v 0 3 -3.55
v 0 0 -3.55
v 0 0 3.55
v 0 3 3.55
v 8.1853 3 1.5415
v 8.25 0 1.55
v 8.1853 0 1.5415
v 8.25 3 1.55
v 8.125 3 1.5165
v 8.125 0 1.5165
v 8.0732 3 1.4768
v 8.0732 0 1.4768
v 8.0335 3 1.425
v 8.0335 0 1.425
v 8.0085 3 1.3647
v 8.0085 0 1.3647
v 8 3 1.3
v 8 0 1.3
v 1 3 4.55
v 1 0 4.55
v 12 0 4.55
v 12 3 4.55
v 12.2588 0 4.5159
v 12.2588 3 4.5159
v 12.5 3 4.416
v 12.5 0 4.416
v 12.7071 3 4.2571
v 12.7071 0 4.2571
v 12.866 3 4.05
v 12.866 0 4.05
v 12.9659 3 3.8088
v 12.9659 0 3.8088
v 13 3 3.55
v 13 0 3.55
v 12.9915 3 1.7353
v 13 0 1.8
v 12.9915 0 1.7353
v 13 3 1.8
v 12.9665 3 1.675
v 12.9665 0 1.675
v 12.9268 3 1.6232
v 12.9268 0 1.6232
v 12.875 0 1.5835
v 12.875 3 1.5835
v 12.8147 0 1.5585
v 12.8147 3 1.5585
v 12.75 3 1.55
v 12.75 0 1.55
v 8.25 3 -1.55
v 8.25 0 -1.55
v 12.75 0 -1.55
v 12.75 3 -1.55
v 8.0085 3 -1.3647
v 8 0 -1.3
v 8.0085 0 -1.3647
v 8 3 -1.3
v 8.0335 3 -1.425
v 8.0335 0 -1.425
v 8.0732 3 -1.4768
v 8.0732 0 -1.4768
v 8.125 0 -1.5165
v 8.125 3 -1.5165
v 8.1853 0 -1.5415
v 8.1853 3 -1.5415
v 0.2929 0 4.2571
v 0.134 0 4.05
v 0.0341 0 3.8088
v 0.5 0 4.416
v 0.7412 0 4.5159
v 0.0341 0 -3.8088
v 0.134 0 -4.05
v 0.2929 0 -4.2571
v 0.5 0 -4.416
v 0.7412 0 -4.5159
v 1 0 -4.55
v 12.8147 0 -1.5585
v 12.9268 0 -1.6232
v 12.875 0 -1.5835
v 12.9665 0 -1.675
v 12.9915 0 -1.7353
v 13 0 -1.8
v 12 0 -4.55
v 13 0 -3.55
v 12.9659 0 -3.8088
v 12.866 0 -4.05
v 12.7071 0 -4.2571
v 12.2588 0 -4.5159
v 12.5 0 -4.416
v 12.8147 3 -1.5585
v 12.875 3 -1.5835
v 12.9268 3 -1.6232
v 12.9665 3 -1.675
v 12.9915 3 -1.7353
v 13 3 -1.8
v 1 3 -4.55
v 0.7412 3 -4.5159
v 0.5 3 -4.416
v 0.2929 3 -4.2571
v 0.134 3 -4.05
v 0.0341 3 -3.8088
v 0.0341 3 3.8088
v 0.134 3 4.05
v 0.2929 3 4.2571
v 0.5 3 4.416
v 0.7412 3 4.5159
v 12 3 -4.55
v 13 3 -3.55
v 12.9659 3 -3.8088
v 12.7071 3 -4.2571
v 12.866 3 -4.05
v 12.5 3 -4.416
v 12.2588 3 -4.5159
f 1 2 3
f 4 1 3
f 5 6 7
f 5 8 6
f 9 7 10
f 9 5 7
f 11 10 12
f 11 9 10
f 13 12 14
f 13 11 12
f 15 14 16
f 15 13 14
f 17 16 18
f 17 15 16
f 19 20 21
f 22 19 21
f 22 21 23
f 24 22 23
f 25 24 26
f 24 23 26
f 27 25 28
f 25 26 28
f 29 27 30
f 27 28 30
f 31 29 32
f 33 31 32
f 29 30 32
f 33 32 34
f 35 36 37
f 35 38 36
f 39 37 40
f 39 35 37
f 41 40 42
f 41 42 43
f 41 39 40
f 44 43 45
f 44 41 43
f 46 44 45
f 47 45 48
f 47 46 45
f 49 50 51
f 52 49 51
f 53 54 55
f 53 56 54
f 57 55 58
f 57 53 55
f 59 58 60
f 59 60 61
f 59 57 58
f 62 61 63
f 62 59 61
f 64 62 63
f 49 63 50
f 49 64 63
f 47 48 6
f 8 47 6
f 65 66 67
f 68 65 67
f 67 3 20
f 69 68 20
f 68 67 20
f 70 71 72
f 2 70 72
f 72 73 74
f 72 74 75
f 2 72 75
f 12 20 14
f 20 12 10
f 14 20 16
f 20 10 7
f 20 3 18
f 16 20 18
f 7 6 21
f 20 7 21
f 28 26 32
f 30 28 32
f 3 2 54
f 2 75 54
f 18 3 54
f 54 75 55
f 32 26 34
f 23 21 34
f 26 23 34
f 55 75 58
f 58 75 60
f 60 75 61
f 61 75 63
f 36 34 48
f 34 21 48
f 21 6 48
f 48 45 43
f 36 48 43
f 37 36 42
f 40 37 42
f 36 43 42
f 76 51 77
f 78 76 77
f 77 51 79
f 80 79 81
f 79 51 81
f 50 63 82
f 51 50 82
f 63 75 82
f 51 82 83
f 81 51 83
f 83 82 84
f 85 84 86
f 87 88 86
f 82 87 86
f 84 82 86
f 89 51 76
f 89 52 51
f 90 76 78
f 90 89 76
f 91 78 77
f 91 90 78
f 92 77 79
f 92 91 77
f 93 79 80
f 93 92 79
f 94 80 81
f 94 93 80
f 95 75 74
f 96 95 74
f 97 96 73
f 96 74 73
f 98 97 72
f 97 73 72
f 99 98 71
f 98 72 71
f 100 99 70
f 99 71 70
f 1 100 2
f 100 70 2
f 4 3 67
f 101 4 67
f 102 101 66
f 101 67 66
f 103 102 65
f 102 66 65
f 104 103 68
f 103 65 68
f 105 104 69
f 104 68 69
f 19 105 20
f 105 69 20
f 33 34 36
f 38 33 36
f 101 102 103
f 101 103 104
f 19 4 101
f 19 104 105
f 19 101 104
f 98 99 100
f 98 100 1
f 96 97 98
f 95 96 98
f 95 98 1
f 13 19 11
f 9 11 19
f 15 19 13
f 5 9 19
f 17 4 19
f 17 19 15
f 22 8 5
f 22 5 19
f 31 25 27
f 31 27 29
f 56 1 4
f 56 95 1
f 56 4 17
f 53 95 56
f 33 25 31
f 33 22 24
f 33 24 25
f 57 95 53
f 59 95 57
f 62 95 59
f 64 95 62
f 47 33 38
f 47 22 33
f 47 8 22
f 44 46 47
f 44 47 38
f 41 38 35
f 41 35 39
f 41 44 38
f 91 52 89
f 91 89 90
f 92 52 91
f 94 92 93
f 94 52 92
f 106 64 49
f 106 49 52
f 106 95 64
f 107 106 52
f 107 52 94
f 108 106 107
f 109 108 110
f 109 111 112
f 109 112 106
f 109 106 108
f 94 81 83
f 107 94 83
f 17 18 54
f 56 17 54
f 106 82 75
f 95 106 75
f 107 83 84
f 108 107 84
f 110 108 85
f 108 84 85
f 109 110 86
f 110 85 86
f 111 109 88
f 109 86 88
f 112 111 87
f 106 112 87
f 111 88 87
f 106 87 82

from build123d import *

# Parameters (mm, degrees)
SALIENTE_EXTRUIR1_DEPTH = 3
REDONDEO1_R             = 0.25


with BuildPart() as part:
    # Croquis1 → Saliente-Extruir1 (new body)
    with BuildSketch(Plane(origin=(0, 0, 0), x_dir=(1, 0, 0), z_dir=(0, 1, 0))):
        with BuildLine():
            Line((0, 3.55), (0, -3.55))
            ThreePointArc((0, -3.55), (0.292893219, -4.257106781), (1, -4.55))
            Line((1, -4.55), (12, -4.55))
            ThreePointArc((12, -4.55), (12.707106781, -4.257106781), (13, -3.55))
            Line((13, -3.55), (13, -1.55))
            Line((13, -1.55), (8, -1.55))
            Line((8, -1.55), (8, 1.55))
            Line((8, 1.55), (13, 1.55))
            Line((13, 1.55), (13, 3.55))
            ThreePointArc((13, 3.55), (12.707106781, 4.257106781), (12, 4.55))
            Line((12, 4.55), (1, 4.55))
            ThreePointArc((1, 4.55), (0.292893219, 4.257106781), (0, 3.55))
        make_face()
    extrude(amount=SALIENTE_EXTRUIR1_DEPTH)

    # Redondeo1
    redondeo1_edges = [part.edges().sort_by_distance(p)[0] for p in [
        (13, 1.5, -1.55),
        (8, 1.5, -1.55),
        (8, 1.5, 1.55),
        (13, 1.5, 1.55),
    ]]
    fillet(redondeo1_edges, radius=REDONDEO1_R)


solid = part.part
